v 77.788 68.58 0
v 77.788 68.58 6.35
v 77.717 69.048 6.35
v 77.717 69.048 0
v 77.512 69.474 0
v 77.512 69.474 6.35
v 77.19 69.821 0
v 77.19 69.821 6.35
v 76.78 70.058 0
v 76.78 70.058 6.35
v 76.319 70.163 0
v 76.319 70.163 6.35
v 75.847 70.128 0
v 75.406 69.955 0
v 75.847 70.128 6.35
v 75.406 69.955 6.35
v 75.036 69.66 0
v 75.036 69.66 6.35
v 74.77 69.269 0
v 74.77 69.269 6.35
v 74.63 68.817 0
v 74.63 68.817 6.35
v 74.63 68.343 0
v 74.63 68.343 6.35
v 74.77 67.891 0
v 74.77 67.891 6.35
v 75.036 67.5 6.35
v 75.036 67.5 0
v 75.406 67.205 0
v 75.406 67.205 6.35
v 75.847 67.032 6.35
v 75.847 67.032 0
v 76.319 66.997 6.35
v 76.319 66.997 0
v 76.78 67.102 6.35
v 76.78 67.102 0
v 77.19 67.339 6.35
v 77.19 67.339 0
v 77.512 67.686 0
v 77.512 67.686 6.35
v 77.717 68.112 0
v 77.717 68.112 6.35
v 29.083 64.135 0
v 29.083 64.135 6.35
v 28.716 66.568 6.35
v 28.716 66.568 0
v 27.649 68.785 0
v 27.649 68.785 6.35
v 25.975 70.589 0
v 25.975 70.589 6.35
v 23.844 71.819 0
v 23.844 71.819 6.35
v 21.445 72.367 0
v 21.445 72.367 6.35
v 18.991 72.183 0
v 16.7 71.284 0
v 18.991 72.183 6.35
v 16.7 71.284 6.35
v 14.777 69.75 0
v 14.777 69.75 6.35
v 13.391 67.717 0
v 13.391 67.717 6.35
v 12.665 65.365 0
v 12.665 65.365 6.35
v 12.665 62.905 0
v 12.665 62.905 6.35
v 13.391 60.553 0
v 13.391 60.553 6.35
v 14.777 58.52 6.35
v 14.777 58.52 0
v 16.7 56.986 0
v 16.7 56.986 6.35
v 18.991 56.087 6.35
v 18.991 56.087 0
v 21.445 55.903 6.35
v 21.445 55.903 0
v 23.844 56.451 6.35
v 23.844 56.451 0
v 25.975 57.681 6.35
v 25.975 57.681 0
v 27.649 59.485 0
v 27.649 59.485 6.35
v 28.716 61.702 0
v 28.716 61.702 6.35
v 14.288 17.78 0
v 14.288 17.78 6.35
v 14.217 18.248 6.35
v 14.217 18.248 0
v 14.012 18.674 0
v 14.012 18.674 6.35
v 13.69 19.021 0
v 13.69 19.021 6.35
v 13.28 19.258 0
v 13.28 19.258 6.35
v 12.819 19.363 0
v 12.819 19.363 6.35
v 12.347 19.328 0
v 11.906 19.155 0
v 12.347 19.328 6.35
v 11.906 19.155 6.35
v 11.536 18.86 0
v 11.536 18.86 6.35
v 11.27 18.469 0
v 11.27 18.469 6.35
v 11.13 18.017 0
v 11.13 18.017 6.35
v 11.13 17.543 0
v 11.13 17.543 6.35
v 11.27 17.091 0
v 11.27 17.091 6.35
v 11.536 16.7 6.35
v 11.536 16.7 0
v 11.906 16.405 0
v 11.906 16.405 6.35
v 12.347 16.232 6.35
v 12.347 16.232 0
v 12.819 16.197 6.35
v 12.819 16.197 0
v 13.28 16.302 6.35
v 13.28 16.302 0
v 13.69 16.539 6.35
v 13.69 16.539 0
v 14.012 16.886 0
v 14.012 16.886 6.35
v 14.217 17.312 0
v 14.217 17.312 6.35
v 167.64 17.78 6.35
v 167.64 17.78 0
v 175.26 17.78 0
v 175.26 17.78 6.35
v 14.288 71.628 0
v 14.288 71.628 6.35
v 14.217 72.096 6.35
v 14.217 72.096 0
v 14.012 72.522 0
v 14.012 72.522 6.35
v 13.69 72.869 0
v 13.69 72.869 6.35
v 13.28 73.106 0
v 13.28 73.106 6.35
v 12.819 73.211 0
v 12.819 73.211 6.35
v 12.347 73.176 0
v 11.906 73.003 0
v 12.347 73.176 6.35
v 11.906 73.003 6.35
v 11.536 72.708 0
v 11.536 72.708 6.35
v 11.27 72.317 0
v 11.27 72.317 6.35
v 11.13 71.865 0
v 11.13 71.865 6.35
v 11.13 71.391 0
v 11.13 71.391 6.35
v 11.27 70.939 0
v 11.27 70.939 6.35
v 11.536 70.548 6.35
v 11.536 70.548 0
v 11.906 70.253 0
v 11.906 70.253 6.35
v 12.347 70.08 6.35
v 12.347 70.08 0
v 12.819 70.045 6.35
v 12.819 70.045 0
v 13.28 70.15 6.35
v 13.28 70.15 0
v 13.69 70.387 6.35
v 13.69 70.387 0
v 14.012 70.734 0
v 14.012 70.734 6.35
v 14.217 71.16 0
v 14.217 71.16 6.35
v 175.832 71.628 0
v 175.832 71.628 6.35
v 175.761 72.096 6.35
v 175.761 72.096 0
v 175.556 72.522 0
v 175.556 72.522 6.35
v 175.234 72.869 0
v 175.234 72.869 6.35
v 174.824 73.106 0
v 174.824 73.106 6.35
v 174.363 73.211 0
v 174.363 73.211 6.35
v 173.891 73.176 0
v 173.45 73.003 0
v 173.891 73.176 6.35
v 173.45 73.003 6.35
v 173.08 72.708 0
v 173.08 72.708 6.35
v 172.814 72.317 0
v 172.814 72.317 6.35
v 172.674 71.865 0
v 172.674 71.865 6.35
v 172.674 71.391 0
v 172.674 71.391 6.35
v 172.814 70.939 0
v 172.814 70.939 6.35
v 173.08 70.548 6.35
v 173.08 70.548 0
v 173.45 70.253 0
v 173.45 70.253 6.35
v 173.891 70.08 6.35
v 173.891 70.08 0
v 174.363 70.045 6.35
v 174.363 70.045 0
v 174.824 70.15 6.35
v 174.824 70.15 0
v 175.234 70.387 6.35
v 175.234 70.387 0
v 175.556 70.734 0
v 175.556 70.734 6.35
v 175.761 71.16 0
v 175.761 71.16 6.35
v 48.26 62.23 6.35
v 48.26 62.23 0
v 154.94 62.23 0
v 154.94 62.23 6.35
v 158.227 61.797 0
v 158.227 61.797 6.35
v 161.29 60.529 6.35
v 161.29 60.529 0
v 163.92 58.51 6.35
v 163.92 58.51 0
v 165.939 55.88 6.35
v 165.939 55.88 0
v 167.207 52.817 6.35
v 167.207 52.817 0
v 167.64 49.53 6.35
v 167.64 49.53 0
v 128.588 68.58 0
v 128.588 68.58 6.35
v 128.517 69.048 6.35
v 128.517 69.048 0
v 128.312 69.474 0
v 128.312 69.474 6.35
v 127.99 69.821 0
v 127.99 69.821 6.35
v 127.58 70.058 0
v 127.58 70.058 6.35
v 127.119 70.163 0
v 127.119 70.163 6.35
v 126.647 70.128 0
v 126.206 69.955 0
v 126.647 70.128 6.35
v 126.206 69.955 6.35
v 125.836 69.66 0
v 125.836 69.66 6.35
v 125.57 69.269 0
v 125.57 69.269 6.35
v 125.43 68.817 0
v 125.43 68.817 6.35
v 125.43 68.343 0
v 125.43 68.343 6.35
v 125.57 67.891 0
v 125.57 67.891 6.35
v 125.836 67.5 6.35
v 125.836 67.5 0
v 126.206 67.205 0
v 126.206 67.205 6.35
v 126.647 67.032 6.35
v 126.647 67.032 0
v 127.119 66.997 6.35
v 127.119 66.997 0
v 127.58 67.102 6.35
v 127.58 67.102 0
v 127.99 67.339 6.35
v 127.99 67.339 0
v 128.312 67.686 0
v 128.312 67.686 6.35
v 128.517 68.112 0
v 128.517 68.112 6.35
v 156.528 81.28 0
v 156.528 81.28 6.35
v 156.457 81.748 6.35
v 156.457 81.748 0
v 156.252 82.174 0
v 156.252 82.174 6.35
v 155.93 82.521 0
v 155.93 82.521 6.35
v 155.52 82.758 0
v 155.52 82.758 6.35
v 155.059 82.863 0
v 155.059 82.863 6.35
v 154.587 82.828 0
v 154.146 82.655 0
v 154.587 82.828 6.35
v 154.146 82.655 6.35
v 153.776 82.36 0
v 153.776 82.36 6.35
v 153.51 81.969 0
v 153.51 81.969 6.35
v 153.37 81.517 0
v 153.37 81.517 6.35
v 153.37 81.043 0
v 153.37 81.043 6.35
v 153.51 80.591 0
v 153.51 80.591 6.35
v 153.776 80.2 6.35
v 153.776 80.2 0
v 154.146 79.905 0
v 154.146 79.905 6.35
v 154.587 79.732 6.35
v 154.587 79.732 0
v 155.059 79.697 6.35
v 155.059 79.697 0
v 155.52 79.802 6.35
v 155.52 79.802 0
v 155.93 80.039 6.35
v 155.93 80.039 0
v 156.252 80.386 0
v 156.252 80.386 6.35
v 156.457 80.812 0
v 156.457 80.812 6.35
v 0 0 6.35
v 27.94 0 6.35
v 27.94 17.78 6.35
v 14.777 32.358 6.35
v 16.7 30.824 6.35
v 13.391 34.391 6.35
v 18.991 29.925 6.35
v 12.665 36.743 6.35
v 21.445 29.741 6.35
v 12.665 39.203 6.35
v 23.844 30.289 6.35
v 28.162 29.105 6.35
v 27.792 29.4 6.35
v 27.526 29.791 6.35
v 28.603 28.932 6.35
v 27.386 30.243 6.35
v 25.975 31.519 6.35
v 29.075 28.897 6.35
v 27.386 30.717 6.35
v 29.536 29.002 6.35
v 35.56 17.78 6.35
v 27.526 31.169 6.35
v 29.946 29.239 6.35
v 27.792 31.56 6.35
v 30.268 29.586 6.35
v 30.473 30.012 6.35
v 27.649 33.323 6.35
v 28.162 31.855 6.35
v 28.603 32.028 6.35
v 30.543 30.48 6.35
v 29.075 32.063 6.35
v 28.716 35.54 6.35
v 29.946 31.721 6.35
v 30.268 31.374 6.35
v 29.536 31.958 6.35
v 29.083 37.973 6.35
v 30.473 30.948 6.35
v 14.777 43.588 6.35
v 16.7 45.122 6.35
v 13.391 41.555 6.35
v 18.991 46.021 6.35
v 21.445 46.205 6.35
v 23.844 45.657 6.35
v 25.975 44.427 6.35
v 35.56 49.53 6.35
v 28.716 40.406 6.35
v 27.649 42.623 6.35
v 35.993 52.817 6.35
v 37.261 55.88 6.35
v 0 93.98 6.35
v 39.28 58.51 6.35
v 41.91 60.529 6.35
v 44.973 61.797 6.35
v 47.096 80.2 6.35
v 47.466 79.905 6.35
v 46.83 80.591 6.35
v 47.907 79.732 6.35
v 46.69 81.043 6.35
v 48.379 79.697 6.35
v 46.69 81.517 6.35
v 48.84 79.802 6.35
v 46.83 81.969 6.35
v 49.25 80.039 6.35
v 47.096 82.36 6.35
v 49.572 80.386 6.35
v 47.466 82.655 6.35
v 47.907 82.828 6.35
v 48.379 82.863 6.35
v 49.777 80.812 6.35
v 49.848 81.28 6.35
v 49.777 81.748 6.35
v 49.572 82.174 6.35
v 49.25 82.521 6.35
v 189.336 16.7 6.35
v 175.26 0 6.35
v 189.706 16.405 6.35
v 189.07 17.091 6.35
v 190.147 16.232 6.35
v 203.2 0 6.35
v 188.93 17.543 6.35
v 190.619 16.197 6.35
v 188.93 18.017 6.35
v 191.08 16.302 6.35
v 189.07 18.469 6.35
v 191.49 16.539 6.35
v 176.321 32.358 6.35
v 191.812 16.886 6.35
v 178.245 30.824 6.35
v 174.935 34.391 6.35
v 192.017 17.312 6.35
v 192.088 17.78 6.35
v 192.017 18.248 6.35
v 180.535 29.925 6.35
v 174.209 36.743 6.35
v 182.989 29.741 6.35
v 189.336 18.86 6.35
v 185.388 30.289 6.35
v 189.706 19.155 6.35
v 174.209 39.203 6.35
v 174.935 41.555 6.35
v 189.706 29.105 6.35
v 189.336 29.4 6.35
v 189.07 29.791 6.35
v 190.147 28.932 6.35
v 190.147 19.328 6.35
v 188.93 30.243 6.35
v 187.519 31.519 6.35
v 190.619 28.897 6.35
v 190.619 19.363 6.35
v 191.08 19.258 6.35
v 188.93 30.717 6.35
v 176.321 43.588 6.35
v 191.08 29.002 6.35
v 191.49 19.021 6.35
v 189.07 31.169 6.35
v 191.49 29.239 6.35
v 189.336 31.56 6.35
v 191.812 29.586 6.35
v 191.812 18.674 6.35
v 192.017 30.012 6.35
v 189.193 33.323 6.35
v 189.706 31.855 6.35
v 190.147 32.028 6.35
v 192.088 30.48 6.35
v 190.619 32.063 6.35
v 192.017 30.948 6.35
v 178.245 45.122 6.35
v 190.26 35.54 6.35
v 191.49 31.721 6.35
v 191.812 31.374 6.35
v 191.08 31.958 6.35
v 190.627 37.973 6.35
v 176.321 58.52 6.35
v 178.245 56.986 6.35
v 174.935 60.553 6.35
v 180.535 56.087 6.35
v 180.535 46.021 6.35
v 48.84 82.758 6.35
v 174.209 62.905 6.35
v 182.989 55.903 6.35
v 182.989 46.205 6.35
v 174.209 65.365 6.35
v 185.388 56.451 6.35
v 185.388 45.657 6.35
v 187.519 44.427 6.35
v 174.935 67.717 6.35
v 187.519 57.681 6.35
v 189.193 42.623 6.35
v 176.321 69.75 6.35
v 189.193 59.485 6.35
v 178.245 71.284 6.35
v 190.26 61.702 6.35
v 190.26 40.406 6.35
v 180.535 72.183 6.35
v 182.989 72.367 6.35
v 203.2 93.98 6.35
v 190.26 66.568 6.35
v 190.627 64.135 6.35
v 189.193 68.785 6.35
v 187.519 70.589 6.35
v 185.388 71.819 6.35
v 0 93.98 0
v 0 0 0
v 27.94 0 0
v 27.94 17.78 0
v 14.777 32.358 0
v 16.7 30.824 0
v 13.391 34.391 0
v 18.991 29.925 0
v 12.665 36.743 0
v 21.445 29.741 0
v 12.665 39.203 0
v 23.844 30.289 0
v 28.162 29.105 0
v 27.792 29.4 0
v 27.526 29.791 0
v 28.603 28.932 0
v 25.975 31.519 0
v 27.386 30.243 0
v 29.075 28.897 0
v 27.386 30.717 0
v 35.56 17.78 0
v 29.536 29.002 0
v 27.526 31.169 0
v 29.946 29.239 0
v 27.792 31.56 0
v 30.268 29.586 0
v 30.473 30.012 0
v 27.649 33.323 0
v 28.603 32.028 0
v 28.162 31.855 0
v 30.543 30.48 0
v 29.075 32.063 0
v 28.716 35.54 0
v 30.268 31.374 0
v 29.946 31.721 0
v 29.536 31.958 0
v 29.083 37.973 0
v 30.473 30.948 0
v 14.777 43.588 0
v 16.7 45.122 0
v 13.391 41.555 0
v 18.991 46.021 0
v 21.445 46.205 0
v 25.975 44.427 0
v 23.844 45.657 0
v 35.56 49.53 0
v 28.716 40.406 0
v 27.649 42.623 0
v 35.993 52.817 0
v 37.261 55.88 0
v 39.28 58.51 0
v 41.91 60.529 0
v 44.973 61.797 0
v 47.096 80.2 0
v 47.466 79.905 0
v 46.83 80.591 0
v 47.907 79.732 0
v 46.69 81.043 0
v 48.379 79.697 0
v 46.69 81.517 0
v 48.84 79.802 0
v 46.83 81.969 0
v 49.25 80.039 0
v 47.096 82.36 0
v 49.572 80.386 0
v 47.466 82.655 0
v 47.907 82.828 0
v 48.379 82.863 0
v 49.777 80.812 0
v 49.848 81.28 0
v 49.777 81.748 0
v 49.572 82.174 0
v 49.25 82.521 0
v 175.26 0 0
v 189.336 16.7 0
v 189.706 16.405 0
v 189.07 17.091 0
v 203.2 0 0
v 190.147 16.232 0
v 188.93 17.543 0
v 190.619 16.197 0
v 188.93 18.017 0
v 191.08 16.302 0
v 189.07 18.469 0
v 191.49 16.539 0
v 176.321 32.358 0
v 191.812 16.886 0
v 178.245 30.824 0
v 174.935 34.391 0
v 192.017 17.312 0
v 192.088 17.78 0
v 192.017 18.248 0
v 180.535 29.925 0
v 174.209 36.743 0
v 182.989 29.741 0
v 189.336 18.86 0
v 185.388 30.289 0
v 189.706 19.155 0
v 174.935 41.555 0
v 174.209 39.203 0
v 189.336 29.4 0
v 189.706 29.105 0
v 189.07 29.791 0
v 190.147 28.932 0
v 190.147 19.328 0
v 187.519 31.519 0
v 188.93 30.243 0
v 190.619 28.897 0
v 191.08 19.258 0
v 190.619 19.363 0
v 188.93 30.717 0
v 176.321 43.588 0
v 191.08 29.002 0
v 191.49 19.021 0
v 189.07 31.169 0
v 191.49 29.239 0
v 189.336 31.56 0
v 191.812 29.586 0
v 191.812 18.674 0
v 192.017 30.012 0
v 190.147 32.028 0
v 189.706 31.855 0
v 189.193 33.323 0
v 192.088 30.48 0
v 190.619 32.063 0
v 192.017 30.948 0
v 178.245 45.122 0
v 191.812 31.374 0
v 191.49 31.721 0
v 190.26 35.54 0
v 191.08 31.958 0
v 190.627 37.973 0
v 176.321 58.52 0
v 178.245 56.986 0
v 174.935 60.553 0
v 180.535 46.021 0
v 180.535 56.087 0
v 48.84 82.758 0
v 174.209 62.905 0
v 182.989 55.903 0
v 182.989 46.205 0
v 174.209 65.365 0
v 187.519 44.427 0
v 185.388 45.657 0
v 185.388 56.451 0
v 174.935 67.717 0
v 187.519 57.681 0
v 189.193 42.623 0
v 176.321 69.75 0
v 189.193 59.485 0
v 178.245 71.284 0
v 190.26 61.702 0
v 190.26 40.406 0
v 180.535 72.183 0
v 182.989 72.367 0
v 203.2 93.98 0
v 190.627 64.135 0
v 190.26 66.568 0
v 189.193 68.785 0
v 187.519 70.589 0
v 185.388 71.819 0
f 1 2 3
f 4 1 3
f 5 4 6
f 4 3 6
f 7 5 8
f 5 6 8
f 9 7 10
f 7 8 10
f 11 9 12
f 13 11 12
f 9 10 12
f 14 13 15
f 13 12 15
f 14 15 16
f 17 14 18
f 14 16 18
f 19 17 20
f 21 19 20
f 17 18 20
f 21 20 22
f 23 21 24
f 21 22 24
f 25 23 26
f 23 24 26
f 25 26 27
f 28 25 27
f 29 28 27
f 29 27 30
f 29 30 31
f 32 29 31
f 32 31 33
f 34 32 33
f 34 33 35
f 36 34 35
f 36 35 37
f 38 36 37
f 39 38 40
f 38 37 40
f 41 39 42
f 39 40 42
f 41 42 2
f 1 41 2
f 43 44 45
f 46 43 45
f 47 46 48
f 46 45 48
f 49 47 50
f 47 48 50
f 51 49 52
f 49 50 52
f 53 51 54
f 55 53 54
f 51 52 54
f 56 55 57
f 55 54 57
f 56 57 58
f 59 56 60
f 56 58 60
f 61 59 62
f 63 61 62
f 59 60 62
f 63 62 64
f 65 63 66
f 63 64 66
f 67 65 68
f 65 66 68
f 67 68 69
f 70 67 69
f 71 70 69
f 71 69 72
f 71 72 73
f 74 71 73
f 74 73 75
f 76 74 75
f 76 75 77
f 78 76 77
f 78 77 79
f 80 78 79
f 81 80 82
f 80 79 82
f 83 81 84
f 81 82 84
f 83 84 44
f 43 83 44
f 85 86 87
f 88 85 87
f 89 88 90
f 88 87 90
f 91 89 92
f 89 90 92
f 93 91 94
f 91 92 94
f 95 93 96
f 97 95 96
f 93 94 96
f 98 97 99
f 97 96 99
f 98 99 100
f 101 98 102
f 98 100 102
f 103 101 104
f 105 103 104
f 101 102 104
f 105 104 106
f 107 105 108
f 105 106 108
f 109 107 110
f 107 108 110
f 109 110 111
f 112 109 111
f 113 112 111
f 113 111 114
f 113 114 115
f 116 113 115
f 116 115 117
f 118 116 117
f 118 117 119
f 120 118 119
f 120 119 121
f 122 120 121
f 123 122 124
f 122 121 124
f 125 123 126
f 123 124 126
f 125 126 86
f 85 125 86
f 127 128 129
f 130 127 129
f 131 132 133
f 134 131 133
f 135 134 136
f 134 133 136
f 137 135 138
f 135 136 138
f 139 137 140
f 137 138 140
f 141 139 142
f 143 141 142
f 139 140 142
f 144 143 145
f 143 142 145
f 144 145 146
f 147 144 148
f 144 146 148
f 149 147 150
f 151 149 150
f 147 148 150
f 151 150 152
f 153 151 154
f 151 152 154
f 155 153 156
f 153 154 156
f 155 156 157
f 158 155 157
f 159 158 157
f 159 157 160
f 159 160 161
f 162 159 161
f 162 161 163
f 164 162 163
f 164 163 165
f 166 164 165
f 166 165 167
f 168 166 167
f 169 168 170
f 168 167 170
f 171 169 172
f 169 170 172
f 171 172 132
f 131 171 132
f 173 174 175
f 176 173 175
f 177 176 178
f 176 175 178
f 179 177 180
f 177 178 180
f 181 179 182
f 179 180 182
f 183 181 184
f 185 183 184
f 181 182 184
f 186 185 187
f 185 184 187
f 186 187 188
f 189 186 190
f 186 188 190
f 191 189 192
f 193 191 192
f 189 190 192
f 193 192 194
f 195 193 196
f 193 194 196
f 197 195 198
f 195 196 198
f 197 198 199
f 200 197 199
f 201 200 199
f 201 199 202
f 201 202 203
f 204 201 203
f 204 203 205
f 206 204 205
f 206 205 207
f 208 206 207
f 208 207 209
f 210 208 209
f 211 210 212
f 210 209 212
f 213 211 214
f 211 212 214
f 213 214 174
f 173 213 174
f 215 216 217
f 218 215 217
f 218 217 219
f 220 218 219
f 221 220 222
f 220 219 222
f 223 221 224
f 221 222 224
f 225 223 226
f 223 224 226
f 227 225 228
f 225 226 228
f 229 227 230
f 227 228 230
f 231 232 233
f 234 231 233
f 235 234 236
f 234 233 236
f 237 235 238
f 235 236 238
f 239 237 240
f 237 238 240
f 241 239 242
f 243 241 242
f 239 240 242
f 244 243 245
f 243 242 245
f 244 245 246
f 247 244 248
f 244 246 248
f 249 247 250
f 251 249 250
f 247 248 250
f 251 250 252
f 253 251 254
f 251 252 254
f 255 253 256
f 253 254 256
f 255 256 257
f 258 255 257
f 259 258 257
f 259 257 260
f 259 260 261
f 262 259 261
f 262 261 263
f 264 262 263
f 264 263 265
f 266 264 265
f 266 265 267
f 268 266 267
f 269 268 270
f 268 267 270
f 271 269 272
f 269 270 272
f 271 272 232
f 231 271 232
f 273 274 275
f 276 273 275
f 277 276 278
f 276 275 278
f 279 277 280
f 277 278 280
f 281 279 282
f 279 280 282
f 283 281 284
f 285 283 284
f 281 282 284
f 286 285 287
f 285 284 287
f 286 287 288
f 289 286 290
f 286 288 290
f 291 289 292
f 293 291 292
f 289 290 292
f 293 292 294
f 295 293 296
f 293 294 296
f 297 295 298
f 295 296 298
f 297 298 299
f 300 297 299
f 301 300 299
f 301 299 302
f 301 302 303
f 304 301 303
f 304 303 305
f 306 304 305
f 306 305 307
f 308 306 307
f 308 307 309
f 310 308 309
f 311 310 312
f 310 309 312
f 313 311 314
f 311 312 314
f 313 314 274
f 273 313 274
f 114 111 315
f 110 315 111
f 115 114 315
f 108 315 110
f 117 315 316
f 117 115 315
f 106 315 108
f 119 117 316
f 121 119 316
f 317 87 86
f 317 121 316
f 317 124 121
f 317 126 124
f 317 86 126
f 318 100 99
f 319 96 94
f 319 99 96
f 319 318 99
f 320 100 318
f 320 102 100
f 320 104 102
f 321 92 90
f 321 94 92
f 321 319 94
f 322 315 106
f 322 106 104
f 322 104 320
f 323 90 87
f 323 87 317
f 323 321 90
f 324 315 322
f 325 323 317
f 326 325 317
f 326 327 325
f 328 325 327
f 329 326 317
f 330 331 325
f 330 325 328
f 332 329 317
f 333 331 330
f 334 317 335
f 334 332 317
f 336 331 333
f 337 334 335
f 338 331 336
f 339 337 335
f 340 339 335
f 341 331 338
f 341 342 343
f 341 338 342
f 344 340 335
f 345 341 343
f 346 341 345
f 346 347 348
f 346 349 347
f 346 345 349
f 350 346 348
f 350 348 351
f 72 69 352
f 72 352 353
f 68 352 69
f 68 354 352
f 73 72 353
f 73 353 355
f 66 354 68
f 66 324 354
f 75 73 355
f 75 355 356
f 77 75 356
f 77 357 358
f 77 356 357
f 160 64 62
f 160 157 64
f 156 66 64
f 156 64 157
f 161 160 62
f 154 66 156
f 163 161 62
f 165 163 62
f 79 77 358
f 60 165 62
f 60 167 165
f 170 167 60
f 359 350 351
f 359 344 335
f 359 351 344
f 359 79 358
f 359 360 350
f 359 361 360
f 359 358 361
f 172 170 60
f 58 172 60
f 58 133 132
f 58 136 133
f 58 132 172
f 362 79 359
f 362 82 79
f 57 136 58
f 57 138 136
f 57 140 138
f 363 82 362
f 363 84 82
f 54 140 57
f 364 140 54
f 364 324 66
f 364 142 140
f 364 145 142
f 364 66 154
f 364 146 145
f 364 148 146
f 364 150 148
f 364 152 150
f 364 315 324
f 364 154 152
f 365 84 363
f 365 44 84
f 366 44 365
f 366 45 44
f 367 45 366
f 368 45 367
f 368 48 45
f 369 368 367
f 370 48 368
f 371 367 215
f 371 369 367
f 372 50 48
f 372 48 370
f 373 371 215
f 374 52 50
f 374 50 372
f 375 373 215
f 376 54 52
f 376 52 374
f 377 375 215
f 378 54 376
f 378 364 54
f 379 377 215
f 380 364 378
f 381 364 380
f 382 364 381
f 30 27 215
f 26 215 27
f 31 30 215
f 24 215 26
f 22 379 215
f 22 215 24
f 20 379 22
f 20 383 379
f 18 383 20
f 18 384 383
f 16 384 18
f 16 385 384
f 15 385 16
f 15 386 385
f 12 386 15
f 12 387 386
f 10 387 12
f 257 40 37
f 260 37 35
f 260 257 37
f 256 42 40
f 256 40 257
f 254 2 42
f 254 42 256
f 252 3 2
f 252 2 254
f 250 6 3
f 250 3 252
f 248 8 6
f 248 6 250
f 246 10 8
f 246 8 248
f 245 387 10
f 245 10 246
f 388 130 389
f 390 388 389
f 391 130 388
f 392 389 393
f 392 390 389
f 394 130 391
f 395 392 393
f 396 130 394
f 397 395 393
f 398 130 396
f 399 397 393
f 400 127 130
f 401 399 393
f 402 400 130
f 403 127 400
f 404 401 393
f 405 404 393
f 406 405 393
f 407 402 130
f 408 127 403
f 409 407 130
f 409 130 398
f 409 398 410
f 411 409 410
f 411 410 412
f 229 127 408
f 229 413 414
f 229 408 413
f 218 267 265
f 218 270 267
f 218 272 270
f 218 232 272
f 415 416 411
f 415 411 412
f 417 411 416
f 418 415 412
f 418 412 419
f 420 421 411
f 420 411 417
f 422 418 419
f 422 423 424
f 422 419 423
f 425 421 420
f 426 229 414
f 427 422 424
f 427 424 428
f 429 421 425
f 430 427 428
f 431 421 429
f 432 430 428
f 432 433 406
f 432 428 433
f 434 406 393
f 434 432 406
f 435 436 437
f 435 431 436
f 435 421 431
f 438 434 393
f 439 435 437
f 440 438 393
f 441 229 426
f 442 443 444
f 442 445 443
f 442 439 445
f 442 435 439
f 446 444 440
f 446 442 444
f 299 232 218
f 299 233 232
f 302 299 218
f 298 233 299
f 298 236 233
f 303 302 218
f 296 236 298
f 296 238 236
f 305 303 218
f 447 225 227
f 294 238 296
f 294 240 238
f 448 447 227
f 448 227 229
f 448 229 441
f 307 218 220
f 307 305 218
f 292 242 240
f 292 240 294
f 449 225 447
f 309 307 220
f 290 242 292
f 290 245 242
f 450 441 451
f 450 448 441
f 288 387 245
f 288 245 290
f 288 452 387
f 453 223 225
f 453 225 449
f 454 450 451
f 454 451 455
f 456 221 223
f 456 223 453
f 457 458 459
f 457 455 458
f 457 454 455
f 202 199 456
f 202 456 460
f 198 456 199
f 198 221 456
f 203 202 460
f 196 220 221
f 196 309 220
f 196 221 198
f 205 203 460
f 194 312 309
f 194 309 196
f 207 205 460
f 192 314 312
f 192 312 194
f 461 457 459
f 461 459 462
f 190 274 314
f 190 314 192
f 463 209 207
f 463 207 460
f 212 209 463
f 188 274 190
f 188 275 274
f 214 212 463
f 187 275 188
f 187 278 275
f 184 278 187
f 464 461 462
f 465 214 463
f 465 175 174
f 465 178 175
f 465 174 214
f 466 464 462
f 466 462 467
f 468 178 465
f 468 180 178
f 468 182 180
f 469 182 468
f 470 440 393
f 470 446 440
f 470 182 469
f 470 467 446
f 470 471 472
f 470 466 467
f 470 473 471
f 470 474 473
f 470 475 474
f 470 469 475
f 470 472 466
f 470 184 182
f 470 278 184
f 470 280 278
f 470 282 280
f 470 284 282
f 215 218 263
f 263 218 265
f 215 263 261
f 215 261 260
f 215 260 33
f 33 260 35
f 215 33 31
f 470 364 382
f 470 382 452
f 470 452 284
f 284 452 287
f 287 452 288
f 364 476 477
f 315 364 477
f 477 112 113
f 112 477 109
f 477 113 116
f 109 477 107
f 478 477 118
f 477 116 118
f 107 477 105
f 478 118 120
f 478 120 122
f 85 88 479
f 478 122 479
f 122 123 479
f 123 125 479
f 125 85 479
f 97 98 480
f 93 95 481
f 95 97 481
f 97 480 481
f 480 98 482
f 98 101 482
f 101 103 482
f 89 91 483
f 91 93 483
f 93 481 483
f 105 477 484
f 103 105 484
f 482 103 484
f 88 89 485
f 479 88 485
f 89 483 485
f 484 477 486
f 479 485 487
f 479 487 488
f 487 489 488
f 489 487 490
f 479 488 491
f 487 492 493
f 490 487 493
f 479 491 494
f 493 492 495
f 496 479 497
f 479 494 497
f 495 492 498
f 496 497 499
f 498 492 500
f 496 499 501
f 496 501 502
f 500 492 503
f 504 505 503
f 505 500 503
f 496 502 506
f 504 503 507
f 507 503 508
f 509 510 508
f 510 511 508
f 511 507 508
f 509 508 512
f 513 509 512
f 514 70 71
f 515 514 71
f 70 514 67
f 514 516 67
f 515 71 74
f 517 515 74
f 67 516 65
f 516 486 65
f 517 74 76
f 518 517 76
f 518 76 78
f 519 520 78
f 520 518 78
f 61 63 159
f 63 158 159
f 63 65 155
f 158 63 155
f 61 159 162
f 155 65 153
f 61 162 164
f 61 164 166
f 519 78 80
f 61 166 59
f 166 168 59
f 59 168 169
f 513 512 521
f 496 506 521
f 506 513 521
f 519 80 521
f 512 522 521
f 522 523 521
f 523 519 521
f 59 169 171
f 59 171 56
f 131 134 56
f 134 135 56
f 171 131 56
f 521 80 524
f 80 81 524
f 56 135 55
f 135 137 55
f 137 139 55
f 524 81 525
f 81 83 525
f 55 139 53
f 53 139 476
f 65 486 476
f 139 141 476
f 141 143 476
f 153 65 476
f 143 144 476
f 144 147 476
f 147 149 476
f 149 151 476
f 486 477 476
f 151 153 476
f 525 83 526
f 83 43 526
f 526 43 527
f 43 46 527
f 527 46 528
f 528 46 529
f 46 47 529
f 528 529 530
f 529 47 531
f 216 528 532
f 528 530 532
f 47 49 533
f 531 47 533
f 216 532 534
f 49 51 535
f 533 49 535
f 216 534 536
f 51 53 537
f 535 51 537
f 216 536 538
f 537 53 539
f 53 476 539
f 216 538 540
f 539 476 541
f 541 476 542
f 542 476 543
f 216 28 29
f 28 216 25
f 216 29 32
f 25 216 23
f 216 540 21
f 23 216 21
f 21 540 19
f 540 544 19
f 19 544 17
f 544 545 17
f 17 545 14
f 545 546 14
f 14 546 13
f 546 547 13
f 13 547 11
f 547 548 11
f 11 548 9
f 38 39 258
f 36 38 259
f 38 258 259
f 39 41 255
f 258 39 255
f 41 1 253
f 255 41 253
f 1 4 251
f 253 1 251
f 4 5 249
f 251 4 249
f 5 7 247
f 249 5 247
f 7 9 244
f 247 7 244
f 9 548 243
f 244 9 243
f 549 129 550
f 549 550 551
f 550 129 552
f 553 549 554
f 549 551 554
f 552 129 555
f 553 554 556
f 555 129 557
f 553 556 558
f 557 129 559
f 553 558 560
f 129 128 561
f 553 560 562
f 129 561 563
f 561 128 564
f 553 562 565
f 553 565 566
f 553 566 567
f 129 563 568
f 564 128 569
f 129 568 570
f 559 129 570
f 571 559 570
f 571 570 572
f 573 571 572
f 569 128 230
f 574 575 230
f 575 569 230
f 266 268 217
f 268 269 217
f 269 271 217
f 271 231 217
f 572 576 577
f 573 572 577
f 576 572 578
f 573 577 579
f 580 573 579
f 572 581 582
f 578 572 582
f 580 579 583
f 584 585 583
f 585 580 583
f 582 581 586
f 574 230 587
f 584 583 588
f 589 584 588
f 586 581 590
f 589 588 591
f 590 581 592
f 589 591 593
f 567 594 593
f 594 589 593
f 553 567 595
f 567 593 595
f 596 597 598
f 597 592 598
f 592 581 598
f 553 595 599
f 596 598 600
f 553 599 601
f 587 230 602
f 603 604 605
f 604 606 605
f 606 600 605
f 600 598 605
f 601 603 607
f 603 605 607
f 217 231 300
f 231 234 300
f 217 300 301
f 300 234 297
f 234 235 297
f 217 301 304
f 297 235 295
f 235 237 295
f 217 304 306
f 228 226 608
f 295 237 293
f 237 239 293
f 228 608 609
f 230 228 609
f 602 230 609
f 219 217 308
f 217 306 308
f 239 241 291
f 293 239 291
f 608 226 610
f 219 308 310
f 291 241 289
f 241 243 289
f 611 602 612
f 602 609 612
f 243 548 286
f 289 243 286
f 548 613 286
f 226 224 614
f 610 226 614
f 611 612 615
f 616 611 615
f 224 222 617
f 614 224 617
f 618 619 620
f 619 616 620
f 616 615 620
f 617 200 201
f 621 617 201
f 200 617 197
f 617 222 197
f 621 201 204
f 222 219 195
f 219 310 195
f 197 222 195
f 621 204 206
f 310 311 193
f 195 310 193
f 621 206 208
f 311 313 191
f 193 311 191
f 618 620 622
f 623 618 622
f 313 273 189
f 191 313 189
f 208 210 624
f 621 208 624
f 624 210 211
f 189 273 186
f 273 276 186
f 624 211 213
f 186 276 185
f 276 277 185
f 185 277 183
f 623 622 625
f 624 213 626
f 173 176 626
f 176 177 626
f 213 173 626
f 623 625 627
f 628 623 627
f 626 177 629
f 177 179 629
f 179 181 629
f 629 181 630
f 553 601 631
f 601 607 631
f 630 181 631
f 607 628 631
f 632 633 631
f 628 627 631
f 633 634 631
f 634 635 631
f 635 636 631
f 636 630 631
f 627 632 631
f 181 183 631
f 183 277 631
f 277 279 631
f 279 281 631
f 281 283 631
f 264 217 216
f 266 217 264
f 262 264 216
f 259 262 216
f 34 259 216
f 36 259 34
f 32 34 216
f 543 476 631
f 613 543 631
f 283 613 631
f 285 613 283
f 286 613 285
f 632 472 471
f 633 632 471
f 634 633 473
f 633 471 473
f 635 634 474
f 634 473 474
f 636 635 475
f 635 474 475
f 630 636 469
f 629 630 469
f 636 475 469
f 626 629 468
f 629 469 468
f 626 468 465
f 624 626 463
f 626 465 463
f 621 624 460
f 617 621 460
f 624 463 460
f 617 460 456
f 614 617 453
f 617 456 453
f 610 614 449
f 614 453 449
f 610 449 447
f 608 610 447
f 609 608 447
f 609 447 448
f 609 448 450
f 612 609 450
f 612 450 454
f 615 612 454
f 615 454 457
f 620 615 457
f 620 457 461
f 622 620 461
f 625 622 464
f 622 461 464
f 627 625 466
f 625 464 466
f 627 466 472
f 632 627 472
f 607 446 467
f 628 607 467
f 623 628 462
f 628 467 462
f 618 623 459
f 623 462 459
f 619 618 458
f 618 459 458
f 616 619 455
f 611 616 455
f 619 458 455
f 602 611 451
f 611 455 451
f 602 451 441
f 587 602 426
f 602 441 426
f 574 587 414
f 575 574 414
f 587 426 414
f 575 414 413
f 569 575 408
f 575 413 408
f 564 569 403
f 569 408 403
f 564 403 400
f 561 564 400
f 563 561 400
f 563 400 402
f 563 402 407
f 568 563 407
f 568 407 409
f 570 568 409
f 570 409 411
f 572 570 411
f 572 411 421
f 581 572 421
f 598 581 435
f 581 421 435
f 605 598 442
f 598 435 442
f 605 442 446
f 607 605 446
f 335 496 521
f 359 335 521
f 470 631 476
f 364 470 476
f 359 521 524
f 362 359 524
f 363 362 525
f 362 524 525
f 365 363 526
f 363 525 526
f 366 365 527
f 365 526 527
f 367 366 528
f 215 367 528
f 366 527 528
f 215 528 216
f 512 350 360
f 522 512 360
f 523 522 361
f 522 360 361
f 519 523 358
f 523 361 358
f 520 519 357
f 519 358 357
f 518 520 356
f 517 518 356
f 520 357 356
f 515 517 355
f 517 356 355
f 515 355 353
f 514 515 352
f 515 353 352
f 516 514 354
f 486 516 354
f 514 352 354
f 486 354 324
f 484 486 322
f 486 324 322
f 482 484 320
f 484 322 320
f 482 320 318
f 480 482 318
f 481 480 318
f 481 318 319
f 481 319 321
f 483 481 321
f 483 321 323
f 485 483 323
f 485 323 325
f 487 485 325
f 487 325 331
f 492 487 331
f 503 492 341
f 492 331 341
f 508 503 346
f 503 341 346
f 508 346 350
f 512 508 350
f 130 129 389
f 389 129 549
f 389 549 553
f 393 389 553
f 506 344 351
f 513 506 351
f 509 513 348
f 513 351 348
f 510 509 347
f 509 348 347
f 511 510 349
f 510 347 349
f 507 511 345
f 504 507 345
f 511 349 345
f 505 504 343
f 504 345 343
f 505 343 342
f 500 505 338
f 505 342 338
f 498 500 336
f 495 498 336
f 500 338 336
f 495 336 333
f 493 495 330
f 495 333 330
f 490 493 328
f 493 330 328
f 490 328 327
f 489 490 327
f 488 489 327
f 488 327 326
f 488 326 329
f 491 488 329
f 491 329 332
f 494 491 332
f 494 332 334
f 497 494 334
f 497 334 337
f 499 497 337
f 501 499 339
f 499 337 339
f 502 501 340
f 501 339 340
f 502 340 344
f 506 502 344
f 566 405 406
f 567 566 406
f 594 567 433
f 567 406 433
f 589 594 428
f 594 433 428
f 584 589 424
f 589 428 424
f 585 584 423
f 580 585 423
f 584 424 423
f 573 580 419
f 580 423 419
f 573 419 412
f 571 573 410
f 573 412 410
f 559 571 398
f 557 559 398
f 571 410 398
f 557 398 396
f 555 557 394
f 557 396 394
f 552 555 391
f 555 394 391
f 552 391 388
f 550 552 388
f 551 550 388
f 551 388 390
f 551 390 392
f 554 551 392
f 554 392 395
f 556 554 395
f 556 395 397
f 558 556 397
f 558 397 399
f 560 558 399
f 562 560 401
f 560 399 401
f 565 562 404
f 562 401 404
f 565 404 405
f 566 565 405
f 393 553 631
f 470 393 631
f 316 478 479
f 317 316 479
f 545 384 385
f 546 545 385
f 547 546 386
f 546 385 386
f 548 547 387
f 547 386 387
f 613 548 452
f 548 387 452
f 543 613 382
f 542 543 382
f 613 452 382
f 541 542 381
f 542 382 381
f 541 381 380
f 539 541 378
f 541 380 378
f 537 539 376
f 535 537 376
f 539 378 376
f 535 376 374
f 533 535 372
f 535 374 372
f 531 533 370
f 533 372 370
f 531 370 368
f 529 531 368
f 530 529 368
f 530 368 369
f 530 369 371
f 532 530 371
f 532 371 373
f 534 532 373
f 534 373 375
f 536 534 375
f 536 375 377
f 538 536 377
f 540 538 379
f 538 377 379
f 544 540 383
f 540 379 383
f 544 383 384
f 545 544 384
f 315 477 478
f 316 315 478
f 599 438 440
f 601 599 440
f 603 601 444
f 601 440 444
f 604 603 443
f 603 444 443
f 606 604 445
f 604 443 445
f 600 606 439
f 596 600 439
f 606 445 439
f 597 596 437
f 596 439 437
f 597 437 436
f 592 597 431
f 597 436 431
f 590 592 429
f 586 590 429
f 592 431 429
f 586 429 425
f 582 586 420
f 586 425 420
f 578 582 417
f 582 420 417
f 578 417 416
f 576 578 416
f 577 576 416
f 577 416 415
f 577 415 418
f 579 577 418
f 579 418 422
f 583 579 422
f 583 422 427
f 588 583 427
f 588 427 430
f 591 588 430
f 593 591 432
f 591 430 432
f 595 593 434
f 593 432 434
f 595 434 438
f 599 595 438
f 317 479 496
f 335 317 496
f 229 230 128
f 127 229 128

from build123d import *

# Parameters (mm, degrees)
F1_DEPTH = 6.35
F2_R     = 1.5875
F2_R_2   = 8.255
F3_DEPTH = 6.35


with BuildPart() as f1:
    # F0 (on Top) → F1 (new body)
    with BuildSketch(Plane.XY):
        with BuildLine():
            Line((0, 93.98), (0, 0))
            Line((0, 0), (27.94, 0))
            Line((27.94, 0), (27.94, 17.78))
            Line((27.94, 17.78), (35.56, 17.78))
            Line((35.56, 17.78), (35.56, 49.53))
            ThreePointArc((35.56, 49.53), (39.279744, 58.510256), (48.26, 62.23))
            Line((48.26, 62.23), (154.94, 62.23))
            ThreePointArc((154.94, 62.23), (163.920256, 58.510256), (167.64, 49.53))
            Line((167.64, 49.53), (167.64, 17.78))
            Line((167.64, 17.78), (175.26, 17.78))
            Line((175.26, 17.78), (175.26, 0))
            Line((175.26, 0), (203.2, 0))
            Line((203.2, 0), (203.2, 93.98))
            Line((203.2, 93.98), (0, 93.98))
        make_face()
    extrude(amount=F1_DEPTH)

    # F2 (on face) → F3 (cut)
    with BuildSketch(Plane.XY.offset(6.35)):
        with Locations((12.7, 17.78)):
            Circle(F2_R)
        with Locations((28.956, 30.48)):
            Circle(F2_R)
        with Locations((20.828, 37.973)):
            Circle(F2_R_2)
        with Locations((20.828, 64.135)):
            Circle(F2_R_2)
        with Locations((12.7, 71.628)):
            Circle(F2_R)
        with Locations((48.26, 81.28)):
            Circle(F2_R)
        with Locations((76.2, 68.58)):
            Circle(F2_R)
        with Locations((127, 68.58)):
            Circle(F2_R)
        with Locations((154.94, 81.28)):
            Circle(F2_R)
        with Locations((174.244, 71.628)):
            Circle(F2_R)
        with Locations((182.372, 64.135)):
            Circle(F2_R_2)
        with Locations((182.372, 37.973)):
            Circle(F2_R_2)
        with Locations((190.5, 30.48)):
            Circle(F2_R)
        with Locations((190.5, 17.78)):
            Circle(F2_R)
    extrude(amount=-F3_DEPTH, mode=Mode.SUBTRACT)


solid = f1.part
